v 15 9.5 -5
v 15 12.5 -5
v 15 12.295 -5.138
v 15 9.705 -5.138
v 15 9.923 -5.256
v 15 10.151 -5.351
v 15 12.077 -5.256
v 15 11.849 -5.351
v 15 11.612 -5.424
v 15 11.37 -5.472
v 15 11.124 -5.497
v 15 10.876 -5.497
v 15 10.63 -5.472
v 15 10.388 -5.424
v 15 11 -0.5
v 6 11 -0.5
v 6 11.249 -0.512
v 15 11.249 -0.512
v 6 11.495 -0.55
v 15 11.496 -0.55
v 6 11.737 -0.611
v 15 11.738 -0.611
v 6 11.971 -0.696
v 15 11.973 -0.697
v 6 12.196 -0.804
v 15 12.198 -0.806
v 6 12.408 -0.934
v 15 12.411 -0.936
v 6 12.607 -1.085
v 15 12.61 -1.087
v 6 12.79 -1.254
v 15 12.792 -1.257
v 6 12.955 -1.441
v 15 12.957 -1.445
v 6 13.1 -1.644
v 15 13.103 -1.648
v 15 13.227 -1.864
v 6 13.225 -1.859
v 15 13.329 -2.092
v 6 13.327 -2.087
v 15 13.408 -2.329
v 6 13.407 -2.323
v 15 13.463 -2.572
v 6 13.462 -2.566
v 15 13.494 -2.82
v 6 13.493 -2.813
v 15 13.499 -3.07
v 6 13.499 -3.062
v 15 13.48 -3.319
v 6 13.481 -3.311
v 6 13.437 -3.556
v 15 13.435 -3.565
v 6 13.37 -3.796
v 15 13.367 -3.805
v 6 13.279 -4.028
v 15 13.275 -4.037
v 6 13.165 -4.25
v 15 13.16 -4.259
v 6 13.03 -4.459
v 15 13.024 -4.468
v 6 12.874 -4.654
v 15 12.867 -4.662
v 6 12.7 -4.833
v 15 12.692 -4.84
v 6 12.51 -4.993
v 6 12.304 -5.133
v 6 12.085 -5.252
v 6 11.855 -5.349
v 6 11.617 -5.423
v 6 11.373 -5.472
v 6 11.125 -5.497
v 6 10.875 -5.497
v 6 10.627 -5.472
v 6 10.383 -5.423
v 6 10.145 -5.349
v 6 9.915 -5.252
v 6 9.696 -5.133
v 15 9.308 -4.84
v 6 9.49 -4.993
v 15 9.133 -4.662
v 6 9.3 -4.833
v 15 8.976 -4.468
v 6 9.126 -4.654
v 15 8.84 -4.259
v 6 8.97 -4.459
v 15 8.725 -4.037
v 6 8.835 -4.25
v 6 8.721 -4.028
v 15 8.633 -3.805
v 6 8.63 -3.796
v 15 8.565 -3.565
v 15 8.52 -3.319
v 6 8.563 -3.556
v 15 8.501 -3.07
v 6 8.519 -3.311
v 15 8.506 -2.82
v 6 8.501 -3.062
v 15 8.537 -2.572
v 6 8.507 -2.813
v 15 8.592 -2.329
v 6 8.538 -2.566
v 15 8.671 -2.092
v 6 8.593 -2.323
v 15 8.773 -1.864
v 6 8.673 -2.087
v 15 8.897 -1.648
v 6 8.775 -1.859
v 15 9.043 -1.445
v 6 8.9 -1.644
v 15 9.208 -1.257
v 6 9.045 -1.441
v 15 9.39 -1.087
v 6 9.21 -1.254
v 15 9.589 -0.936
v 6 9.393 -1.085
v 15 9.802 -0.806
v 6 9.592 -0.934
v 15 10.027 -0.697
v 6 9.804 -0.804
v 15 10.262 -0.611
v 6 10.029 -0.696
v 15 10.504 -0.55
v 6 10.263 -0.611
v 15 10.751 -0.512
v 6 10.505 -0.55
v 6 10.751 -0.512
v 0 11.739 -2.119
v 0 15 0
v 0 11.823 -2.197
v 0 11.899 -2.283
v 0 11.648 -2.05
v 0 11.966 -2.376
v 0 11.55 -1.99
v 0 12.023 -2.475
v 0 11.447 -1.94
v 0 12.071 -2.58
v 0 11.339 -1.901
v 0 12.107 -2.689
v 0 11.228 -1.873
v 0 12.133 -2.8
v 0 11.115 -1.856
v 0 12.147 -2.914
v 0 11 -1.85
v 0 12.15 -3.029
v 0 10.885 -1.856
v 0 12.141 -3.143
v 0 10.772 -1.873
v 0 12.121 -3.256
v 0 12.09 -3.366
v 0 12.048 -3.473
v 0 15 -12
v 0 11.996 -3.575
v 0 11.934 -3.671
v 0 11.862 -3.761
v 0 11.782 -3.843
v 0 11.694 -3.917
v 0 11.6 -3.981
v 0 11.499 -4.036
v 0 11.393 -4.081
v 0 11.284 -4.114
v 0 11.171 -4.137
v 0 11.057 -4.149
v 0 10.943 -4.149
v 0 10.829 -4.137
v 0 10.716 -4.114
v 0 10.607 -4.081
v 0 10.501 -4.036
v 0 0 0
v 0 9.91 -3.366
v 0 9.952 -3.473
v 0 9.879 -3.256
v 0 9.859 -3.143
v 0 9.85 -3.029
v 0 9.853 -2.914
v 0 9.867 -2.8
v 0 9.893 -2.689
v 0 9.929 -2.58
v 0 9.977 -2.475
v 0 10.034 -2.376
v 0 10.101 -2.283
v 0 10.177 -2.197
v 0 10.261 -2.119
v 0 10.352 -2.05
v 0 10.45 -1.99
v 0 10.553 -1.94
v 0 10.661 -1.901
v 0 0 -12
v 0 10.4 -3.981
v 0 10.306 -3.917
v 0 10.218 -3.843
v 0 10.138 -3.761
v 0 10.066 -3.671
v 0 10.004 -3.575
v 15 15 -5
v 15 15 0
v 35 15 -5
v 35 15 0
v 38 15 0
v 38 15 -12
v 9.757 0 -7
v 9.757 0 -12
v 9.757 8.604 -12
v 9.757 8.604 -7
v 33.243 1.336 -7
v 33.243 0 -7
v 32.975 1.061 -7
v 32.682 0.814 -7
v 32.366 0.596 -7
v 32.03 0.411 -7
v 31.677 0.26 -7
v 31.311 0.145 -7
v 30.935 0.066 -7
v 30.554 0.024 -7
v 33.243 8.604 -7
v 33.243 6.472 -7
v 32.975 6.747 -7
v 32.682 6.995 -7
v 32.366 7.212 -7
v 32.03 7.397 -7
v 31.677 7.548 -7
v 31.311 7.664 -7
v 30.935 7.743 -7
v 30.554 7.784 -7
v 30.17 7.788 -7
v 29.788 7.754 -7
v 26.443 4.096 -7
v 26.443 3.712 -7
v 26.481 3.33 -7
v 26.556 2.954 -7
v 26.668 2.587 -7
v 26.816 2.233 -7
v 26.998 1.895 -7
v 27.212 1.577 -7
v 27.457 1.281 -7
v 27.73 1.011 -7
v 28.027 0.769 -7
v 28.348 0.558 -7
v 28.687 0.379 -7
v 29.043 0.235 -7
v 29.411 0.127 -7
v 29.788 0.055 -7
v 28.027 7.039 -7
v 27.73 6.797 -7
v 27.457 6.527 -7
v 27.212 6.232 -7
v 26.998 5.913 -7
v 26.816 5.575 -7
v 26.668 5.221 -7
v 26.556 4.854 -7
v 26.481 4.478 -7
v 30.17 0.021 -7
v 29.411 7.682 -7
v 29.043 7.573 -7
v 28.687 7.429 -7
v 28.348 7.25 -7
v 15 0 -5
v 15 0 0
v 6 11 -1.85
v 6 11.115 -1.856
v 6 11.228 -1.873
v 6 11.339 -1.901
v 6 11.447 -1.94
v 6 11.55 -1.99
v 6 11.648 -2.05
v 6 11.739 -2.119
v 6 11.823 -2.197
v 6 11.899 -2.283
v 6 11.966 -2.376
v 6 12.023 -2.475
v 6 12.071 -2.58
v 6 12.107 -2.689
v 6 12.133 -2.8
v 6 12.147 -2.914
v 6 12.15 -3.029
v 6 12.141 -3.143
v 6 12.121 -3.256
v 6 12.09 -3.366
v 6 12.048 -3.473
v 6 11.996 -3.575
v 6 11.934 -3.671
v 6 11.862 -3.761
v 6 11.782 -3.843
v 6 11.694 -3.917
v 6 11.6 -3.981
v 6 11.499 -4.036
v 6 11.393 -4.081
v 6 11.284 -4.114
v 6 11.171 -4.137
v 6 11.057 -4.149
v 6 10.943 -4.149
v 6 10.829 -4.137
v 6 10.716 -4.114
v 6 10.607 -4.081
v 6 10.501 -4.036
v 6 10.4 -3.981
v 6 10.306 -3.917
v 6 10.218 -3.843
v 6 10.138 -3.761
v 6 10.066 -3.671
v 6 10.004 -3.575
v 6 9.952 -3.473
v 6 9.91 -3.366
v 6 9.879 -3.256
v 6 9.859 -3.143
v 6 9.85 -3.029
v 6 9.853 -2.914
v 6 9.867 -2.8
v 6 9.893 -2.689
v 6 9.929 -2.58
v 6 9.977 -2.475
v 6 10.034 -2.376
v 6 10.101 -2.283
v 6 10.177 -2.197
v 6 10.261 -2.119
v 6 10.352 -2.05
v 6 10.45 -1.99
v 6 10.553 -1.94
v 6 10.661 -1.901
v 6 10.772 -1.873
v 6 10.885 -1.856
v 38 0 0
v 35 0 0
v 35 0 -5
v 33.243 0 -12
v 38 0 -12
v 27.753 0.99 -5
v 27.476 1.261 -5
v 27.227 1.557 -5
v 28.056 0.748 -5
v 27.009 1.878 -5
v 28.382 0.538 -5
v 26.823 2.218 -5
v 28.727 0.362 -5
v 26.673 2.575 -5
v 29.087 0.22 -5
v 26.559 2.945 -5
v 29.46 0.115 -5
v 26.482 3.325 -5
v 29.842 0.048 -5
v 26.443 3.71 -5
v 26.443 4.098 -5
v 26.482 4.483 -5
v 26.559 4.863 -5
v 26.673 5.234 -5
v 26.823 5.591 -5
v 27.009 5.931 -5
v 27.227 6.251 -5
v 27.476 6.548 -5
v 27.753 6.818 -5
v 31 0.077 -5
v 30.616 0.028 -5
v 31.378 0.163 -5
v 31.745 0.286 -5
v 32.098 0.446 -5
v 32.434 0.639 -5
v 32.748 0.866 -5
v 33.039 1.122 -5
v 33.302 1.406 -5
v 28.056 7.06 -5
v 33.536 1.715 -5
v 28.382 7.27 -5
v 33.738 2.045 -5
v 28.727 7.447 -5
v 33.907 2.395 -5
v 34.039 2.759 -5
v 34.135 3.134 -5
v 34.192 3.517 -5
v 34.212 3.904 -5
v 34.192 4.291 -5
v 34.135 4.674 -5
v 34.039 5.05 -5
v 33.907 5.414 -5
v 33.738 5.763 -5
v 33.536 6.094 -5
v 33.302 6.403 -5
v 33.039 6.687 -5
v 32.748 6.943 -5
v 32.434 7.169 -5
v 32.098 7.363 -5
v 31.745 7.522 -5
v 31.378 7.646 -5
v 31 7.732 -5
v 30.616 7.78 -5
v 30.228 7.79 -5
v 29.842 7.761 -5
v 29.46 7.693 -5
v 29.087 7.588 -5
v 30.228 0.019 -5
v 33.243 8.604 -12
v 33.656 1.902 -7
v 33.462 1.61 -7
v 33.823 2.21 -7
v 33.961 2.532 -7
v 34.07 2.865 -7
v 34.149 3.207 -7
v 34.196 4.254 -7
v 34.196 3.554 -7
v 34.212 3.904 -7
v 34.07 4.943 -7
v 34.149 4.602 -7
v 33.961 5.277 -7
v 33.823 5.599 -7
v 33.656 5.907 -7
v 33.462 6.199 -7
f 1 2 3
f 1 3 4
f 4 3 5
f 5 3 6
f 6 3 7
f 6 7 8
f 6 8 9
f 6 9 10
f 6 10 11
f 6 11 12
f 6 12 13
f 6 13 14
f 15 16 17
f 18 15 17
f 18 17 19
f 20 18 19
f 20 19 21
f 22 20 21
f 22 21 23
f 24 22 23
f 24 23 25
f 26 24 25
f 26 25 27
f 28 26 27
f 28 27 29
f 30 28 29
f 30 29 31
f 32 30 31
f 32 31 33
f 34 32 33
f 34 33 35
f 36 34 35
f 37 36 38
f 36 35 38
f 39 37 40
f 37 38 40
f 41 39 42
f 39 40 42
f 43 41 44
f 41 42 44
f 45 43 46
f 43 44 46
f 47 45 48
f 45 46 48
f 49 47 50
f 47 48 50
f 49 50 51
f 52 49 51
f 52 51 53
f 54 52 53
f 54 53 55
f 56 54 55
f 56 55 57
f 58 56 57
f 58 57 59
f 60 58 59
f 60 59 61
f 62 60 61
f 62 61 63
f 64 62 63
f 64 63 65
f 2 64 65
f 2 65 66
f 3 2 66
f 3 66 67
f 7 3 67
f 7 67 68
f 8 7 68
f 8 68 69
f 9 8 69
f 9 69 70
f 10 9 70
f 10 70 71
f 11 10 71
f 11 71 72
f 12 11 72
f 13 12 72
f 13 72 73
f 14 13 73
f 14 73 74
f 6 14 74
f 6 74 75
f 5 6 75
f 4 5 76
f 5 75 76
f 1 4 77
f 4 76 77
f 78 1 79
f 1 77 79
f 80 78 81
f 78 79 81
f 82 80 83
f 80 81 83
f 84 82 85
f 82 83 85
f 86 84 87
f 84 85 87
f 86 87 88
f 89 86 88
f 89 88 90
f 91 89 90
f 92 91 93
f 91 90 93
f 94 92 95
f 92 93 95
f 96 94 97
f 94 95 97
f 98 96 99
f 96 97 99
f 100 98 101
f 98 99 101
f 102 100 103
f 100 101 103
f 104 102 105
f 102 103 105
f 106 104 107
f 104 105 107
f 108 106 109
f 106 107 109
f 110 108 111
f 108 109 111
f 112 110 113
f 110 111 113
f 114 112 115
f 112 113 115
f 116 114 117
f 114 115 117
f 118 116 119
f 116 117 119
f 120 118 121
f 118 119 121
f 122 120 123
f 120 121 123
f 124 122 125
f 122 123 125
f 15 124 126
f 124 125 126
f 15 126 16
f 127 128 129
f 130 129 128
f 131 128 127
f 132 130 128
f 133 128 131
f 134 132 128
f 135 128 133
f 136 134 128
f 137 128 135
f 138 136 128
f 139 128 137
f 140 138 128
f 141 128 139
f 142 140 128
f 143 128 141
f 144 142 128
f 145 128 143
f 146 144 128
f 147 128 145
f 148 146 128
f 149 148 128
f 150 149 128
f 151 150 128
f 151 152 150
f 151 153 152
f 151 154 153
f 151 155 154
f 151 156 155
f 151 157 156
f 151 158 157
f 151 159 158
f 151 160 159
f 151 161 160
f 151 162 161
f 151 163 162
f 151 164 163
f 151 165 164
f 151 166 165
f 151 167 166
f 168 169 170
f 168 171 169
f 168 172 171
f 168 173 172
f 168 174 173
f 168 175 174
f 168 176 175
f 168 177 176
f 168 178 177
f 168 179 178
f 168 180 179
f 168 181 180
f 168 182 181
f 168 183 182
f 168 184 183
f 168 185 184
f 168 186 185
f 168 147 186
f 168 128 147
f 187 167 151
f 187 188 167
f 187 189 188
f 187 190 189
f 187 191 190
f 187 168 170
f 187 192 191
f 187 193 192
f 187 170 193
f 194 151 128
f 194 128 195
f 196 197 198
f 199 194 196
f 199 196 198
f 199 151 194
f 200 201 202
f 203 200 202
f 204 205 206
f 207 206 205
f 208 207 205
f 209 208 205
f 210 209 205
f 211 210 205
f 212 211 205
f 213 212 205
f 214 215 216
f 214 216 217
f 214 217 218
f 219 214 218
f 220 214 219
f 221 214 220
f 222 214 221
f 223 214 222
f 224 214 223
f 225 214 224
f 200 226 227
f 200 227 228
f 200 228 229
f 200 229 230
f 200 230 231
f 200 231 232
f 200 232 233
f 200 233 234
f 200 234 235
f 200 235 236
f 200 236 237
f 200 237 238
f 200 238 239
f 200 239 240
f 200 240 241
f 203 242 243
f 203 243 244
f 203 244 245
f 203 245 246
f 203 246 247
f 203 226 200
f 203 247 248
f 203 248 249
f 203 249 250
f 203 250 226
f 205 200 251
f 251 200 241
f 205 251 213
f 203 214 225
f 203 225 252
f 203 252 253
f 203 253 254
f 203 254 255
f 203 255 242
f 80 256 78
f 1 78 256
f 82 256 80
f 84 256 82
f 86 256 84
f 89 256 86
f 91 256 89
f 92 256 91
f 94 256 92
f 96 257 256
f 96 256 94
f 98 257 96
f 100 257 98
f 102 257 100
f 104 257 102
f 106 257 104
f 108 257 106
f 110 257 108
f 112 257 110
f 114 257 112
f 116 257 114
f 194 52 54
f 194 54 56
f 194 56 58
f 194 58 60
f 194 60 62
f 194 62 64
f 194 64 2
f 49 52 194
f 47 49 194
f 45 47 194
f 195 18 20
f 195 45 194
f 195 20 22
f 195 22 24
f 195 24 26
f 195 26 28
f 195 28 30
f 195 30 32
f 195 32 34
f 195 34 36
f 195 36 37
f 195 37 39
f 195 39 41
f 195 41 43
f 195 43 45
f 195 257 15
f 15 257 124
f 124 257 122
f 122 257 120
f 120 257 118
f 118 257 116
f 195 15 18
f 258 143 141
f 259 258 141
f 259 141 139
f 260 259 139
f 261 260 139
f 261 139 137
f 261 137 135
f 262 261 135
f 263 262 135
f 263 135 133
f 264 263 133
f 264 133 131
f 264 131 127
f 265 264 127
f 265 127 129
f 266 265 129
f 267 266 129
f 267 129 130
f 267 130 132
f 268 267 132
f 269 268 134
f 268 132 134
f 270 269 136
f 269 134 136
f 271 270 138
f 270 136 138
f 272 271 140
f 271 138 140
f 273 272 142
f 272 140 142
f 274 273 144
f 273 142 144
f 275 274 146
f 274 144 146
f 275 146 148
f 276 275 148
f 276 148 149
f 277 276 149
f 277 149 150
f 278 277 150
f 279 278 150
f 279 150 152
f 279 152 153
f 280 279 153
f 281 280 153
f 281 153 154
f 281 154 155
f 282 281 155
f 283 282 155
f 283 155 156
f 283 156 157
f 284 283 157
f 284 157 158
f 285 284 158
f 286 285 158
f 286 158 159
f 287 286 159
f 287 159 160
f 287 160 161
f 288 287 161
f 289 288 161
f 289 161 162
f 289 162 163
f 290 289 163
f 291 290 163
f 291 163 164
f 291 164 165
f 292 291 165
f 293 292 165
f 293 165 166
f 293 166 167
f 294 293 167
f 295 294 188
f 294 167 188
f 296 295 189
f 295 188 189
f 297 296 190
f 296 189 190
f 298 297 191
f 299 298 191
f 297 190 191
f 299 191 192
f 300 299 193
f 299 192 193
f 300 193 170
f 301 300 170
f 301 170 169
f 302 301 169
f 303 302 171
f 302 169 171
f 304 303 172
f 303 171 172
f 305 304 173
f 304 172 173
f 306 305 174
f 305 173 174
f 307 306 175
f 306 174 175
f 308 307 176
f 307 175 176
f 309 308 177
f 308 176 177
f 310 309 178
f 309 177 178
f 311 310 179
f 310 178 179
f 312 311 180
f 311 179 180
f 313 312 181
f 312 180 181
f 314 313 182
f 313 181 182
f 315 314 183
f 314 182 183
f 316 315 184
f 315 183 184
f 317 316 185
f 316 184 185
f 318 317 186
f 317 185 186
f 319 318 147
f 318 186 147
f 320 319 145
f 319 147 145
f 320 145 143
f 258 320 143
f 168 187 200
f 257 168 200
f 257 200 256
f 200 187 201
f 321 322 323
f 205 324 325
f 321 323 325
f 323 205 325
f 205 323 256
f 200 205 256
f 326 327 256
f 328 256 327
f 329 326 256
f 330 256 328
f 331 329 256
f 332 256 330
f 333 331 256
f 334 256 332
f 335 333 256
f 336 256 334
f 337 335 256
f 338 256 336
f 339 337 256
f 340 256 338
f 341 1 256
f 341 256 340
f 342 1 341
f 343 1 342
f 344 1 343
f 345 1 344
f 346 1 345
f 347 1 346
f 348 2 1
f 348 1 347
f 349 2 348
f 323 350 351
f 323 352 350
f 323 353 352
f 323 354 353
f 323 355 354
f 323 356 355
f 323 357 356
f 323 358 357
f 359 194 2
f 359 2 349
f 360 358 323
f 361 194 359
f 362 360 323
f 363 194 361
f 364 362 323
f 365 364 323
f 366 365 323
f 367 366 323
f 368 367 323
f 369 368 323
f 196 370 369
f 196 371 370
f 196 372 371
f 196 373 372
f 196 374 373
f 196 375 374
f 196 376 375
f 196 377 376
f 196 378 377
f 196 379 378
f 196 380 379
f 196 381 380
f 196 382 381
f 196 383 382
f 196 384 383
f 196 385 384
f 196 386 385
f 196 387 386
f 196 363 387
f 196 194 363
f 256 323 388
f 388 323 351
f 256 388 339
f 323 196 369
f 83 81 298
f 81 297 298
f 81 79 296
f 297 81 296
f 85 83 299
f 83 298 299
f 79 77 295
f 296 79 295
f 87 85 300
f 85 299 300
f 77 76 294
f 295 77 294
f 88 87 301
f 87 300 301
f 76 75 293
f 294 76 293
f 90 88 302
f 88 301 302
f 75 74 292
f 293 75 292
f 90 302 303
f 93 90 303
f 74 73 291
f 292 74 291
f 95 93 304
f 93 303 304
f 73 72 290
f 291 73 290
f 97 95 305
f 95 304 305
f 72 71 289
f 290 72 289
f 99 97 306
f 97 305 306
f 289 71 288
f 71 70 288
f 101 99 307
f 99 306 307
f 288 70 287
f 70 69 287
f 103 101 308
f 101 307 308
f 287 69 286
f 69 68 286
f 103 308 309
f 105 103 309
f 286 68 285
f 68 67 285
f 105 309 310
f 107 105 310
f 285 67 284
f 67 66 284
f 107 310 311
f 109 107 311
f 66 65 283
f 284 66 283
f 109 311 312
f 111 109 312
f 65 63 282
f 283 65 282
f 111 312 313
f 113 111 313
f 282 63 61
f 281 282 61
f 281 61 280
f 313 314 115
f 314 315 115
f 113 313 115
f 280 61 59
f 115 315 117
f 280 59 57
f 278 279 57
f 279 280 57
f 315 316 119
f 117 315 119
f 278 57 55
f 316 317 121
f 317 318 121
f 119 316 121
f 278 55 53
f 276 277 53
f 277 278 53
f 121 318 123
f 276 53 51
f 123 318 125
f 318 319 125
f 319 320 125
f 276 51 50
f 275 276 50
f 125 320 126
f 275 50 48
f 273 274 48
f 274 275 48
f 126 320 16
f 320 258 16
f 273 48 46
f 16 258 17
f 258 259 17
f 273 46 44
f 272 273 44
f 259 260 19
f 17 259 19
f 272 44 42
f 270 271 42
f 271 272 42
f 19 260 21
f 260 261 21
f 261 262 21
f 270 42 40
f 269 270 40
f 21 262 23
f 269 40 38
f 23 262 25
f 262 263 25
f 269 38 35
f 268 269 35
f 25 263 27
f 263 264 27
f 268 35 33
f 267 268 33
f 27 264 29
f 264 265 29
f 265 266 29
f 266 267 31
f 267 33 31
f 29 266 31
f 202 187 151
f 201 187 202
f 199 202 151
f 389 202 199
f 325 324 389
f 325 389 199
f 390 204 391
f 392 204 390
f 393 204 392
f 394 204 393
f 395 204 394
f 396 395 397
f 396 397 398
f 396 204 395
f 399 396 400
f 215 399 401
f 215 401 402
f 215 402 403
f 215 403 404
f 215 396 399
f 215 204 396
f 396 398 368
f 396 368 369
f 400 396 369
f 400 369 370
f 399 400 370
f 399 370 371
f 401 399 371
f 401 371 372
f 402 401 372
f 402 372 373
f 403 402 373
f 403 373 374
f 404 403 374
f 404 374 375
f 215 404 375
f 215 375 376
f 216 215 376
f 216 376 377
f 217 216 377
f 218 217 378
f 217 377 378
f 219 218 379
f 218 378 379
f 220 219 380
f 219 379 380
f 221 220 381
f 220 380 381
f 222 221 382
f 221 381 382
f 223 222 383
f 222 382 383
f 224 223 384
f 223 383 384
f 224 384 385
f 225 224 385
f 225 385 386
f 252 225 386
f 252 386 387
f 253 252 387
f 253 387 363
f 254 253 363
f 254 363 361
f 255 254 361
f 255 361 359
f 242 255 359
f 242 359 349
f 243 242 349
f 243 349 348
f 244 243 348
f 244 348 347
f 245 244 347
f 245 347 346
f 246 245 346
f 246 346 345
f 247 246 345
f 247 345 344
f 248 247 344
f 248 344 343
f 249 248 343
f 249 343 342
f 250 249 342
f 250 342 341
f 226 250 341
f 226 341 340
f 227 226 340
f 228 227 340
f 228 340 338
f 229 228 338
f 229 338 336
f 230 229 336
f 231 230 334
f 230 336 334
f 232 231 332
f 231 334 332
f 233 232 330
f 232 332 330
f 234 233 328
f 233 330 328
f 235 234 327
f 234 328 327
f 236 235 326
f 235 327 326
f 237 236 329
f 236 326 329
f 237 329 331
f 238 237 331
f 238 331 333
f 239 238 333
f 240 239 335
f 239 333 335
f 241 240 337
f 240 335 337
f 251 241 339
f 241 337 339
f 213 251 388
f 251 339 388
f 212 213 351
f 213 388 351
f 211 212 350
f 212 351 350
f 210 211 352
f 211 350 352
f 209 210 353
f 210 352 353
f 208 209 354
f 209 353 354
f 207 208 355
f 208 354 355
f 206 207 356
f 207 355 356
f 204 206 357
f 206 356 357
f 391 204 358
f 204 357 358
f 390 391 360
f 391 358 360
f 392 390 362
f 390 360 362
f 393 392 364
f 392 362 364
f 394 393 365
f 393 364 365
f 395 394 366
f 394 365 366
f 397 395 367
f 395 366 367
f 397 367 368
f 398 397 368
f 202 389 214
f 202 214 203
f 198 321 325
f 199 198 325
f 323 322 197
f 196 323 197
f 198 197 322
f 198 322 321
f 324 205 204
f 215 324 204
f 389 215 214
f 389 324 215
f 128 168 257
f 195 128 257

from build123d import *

# Parameters (mm, degrees)
SKETCH1_W           = 38
SKETCH1_H           = 12
BOSS_EXTRUDE1_DEPTH = 15
SKETCH2_R           = 1.15
CUT_EXTRUDE1_DEPTH  = 15
SKETCH3_W           = 20
SKETCH3_H           = 15
CUT_EXTRUDE2_DEPTH  = 5
CUT_EXTRUDE3_START  = -6
SKETCH2_3_R         = 2.5
CUT_EXTRUDE3_DEPTH  = 9
SKETCH4_W           = 23.485116632
SKETCH4_H           = 8.604460082
CUT_EXTRUDE4_DEPTH  = 5
SKETCH5_R           = 3.886662334
CUT_EXTRUDE5_DEPTH  = 2


with BuildPart() as part:
    # Sketch1 → Boss-Extrude1 (new body)
    with BuildSketch(Plane(origin=(0, 0, 0), x_dir=(1, 0, 0), z_dir=(0, 1, 0))):
        with Locations((19, 6)):
            Rectangle(SKETCH1_W, SKETCH1_H)
    extrude(amount=BOSS_EXTRUDE1_DEPTH)

    # Sketch2 → Cut-Extrude1 (cut)
    with BuildSketch(Plane.ZY):
        with Locations((-3, 11)):
            Circle(SKETCH2_R)
    extrude(amount=-CUT_EXTRUDE1_DEPTH, mode=Mode.SUBTRACT)

    # Sketch3 → Cut-Extrude2 (cut)
    with BuildSketch(Plane.XY):
        with Locations((25, 7.5)):
            Rectangle(SKETCH3_W, SKETCH3_H)
    extrude(amount=-CUT_EXTRUDE2_DEPTH, mode=Mode.SUBTRACT)

    # Sketch2<3> → Cut-Extrude3 (cut)
    with BuildSketch(Plane.ZY.offset(CUT_EXTRUDE3_START)):
        with Locations((-3, 11)):
            Circle(SKETCH2_3_R)
    extrude(amount=-CUT_EXTRUDE3_DEPTH, mode=Mode.SUBTRACT)

    # Sketch4 → Cut-Extrude4 (cut)
    with BuildSketch(Plane(origin=(0, 0, -12), x_dir=(-1, 0, 0), z_dir=(0, 0, -1))):
        with Locations((-21.50003141, 4.302230041)):
            Rectangle(SKETCH4_W, SKETCH4_H)
    extrude(amount=-CUT_EXTRUDE4_DEPTH, mode=Mode.SUBTRACT)

    # Sketch5 → Cut-Extrude5 (cut)
    with BuildSketch(Plane.XY.offset(-5)):
        with Locations((30.325082157, 3.904217079)):
            Circle(SKETCH5_R)
    extrude(amount=-CUT_EXTRUDE5_DEPTH, mode=Mode.SUBTRACT)


solid = part.part
